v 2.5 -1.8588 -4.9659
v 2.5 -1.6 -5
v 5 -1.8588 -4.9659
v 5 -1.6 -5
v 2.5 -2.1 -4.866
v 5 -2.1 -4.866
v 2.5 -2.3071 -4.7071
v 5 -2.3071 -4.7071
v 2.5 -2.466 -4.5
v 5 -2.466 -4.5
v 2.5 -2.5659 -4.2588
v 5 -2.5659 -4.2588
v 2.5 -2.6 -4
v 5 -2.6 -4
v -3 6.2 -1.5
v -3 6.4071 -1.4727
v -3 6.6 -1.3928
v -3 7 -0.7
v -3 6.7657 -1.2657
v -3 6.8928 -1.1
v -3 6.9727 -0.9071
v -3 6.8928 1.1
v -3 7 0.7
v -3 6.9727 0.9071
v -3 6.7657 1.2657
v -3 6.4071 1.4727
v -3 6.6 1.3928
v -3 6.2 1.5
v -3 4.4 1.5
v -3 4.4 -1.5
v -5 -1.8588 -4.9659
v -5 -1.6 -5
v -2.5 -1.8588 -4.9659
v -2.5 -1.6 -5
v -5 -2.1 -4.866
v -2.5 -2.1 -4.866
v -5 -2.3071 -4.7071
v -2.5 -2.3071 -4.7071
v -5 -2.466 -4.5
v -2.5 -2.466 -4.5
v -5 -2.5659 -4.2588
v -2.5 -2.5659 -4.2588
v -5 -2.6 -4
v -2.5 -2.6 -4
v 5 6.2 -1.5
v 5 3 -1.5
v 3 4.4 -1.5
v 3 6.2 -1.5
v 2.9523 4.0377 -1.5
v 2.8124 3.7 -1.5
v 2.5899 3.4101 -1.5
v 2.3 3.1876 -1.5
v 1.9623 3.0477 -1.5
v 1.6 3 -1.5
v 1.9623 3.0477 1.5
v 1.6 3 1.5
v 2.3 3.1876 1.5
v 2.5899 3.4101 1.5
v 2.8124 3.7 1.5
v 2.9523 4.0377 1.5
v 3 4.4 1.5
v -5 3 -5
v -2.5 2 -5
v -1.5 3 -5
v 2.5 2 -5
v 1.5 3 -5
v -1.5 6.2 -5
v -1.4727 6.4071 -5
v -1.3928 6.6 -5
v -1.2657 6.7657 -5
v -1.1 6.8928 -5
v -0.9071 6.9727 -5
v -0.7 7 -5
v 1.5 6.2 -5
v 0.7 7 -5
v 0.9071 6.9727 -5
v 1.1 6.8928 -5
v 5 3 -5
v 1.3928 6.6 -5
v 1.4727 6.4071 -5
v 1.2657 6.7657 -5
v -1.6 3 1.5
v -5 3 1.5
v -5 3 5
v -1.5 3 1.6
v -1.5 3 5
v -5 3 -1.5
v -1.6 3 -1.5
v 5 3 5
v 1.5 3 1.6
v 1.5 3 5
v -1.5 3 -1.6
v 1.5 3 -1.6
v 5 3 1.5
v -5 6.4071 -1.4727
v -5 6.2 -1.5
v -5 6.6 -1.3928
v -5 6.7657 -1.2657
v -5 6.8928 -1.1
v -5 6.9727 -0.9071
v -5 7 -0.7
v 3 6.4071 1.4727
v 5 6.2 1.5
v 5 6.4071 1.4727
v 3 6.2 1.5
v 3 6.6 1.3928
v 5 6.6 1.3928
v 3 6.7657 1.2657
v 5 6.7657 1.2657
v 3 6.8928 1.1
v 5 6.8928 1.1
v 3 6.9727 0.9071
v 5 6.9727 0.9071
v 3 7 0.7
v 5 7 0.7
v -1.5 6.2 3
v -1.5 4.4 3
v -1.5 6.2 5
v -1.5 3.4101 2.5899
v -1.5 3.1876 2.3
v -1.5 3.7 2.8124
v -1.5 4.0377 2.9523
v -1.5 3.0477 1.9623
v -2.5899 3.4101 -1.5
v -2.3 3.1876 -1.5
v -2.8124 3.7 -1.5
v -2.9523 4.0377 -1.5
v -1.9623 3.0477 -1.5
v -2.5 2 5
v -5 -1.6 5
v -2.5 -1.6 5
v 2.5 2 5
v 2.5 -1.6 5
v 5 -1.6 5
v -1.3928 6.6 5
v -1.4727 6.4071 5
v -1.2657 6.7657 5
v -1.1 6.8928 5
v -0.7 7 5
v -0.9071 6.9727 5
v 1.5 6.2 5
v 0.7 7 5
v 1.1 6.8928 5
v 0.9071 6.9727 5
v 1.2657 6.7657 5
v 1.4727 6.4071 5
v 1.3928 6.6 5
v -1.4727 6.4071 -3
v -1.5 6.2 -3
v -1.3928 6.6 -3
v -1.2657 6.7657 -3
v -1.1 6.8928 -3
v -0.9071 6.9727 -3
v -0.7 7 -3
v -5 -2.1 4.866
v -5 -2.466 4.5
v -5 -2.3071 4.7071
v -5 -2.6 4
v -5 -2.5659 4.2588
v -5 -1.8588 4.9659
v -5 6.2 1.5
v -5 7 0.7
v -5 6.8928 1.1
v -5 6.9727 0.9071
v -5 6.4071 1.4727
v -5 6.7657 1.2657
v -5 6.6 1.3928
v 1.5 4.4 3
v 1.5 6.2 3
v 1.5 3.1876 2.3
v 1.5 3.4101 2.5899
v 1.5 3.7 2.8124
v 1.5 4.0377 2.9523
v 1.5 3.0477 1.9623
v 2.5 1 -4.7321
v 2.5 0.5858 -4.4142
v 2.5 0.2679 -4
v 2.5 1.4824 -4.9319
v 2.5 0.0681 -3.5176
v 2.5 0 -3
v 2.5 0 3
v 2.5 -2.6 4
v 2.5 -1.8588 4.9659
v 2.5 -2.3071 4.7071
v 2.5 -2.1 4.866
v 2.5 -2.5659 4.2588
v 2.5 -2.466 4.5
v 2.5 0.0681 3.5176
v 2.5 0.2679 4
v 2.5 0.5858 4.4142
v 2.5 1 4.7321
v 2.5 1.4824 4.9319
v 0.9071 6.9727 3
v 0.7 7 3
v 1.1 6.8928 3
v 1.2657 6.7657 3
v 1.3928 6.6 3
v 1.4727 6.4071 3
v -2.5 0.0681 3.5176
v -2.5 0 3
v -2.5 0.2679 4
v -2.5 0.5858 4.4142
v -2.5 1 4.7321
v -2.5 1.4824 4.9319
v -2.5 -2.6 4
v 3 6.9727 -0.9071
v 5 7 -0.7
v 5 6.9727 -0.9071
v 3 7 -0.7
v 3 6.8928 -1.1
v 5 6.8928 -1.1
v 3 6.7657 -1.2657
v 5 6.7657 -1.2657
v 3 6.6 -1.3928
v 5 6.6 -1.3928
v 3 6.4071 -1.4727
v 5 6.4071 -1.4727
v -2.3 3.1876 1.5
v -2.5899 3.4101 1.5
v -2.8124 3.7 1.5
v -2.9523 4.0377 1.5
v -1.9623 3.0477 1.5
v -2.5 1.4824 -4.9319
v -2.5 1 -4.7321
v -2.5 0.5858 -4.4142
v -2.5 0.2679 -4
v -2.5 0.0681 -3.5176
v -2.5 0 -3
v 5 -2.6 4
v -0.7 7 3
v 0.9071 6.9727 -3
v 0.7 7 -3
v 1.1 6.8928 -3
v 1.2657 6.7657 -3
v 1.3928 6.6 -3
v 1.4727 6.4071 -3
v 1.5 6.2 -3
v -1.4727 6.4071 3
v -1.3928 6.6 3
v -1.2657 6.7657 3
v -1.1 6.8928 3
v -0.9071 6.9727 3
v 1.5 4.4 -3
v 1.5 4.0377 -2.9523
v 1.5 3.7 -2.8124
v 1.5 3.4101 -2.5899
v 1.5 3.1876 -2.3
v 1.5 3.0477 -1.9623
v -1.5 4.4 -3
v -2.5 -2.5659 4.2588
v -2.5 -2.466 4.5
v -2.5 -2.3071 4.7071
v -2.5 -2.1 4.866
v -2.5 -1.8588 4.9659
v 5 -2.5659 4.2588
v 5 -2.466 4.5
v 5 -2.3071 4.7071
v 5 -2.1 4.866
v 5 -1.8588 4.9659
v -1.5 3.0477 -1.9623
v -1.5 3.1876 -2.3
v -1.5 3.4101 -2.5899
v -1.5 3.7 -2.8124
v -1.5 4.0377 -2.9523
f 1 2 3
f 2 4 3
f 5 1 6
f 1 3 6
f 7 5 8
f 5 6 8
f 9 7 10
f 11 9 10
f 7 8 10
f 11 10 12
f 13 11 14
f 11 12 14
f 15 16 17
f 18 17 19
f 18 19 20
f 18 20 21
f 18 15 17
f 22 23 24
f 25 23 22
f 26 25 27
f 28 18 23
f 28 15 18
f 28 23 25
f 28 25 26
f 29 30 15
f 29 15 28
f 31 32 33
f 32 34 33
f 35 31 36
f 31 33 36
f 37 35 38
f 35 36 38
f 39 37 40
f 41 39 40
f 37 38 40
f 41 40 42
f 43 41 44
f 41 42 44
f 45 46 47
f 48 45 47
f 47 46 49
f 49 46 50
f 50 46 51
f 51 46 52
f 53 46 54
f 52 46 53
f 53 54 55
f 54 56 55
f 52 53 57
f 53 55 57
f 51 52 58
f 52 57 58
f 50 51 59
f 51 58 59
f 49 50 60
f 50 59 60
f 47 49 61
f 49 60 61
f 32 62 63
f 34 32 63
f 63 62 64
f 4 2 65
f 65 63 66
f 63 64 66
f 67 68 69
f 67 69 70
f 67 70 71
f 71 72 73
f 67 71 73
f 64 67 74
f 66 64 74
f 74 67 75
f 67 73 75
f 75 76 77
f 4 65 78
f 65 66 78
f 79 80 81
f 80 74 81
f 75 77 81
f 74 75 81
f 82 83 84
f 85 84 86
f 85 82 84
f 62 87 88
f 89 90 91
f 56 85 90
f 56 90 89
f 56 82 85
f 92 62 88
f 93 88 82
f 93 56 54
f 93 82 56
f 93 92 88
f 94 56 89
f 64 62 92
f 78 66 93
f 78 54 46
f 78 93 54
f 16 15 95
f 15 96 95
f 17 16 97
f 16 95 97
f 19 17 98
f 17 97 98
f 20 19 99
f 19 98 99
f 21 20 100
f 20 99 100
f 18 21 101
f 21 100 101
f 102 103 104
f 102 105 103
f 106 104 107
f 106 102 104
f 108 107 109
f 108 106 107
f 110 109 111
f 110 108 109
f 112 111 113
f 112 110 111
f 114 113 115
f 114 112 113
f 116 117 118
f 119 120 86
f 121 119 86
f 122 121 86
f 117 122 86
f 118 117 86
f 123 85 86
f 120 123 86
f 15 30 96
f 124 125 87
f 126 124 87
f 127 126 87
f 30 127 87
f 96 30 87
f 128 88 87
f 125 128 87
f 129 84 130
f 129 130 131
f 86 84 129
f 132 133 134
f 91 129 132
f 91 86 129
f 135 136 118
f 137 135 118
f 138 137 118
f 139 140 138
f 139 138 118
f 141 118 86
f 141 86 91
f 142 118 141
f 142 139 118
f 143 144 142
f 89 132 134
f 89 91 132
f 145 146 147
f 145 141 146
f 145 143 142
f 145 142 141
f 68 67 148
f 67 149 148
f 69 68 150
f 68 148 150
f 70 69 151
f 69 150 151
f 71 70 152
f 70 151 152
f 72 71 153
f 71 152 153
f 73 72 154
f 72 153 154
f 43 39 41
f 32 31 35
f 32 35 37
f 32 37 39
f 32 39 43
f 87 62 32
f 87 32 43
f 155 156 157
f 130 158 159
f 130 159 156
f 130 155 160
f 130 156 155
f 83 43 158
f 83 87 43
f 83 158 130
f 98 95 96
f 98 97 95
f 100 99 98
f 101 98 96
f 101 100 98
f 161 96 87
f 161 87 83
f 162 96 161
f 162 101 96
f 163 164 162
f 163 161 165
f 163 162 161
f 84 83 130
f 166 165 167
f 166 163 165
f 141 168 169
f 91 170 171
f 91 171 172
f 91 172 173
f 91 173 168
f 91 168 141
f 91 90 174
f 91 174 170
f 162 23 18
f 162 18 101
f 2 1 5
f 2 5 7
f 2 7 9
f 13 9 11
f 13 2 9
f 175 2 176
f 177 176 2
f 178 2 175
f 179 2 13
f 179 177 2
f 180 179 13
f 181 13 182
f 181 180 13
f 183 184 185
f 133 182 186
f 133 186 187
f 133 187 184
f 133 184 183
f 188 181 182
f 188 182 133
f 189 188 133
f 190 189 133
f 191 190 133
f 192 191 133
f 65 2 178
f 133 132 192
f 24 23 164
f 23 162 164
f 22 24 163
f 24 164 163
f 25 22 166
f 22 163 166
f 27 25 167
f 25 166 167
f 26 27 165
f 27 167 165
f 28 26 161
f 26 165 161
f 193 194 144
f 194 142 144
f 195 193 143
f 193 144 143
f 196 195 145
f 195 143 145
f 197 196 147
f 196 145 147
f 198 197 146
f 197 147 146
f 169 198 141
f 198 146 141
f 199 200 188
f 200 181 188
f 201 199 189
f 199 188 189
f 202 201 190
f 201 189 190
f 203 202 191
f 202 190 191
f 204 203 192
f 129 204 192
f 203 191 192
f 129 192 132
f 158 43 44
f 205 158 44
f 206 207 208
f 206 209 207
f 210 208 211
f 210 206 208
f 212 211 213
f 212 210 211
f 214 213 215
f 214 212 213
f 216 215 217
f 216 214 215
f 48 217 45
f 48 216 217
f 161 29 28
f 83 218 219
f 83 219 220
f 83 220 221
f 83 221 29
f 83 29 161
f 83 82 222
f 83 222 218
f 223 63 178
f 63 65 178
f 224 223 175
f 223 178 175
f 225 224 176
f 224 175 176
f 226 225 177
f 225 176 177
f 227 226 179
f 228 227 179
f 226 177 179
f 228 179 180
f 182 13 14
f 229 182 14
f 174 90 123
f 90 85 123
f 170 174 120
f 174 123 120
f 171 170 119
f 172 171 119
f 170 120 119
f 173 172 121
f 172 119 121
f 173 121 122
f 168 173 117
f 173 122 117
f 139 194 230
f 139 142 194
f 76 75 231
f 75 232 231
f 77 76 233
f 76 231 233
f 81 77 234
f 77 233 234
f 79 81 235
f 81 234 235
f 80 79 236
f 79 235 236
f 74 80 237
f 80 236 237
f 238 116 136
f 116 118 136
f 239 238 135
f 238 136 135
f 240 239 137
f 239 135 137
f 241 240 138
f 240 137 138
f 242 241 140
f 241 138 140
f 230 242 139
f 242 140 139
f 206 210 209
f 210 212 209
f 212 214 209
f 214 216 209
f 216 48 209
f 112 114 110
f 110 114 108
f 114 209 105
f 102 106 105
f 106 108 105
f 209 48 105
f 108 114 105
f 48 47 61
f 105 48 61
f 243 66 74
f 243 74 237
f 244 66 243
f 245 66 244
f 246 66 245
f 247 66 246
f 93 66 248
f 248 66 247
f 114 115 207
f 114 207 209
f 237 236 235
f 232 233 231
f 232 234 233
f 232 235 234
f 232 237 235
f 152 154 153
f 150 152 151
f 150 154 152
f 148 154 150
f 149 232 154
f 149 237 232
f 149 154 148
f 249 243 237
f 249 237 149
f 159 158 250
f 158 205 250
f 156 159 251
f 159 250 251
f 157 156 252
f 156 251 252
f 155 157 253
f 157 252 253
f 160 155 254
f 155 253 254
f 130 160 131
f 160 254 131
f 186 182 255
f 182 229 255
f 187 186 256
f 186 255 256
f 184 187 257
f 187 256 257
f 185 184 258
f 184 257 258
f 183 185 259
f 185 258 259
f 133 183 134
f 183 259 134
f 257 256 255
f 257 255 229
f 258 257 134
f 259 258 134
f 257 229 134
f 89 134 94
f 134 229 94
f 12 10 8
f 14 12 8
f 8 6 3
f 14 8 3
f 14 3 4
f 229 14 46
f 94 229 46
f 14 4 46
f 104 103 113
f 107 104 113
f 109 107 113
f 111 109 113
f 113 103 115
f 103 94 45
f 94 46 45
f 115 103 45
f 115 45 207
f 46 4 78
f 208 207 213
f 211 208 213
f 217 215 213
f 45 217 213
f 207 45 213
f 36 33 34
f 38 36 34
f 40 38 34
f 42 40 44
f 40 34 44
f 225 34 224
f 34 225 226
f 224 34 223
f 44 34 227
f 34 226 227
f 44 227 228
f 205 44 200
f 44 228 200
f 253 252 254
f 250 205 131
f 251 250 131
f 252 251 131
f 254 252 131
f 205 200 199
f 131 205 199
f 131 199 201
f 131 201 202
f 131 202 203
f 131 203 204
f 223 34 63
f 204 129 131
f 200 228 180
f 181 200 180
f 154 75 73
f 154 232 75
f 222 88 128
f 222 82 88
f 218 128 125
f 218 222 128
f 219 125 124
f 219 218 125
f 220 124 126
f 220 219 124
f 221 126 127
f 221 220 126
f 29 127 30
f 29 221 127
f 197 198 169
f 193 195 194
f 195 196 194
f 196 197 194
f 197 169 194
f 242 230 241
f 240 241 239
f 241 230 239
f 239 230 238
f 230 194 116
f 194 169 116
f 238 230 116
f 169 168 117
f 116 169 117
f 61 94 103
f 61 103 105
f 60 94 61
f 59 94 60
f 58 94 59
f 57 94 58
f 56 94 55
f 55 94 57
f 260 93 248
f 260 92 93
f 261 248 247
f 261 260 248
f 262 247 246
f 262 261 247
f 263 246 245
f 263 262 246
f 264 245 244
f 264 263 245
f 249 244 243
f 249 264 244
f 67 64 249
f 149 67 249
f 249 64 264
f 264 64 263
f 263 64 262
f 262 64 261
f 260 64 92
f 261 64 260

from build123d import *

# Parameters (mm, degrees)
BOX_W        = 10
BOX_H        = 3
BOX_DEPTH    = 10
SKETCH_W     = 3
SKETCH_H     = 2
SKETCH_W_2   = 2
SKETCH_H_2   = 3
PAD_DEPTH    = 4
SKETCH001_W  = 2.5
SKETCH001_H  = 10
PAD001_DEPTH = 2.6
FILLET_R     = 2
FILLET001_R  = 0.8
FILLET002_R  = 1
FILLET003_R  = 1.4


with BuildPart() as part:
    # Box → Box (new body)
    with BuildSketch(Plane(origin=(-5, 0, -5), x_dir=(1, 0, 0), z_dir=(0, 0, 1))):
        with Locations((5, 1.5)):
            Rectangle(BOX_W, BOX_H)
    extrude(amount=BOX_DEPTH)

    # Sketch → Pad (new body)
    with BuildSketch(Plane(origin=(-5, 3, -5), x_dir=(-1, 0, 0), z_dir=(0, 1, 0))):
        with Locations((-5, 9)):
            Rectangle(SKETCH_W, SKETCH_H)
        with Locations((-9, 5)):
            Rectangle(SKETCH_W_2, SKETCH_H_2)
        with Locations((-1, 5)):
            Rectangle(SKETCH_W_2, SKETCH_H_2)
        with Locations((-5, 1)):
            Rectangle(SKETCH_W, SKETCH_H)
    extrude(amount=PAD_DEPTH)

    # Sketch001 → Pad001 (new body)
    with BuildSketch(Plane(origin=(-5, 0, -5), x_dir=(1, 0, 0), z_dir=(0, -1, 0))):
        with Locations((1.25, 5)):
            Rectangle(SKETCH001_W, SKETCH001_H)
        with Locations((8.75, 5)):
            Rectangle(SKETCH001_W, SKETCH001_H)
    extrude(amount=PAD001_DEPTH)

    # Fillet
    fillet_edges = [part.edges().sort_by_distance(p)[0] for p in [
        (0, 0, -5),
        (0, 0, 5),
    ]]
    fillet(fillet_edges, radius=FILLET_R)

    # Fillet001
    fillet001_edges = [part.edges().sort_by_distance(p)[0] for p in [
        (4, 7, -1.5),
        (4, 7, 1.5),
        (1.5, 7, 4),
        (-1.5, 7, 4),
        (-4, 7, 1.5),
        (-4, 7, -1.5),
        (-1.5, 7, -4),
        (1.5, 7, -4),
    ]]
    fillet(fillet001_edges, radius=FILLET001_R)

    # Fillet002
    fillet002_edges = [part.edges().sort_by_distance(p)[0] for p in [
        (-3.75, -2.6, -5),
        (3.75, -2.6, -5),
        (3.75, -2.6, 5),
        (-3.75, -2.6, 5),
    ]]
    fillet(fillet002_edges, radius=FILLET002_R)

    # Fillet003
    fillet003_edges = [part.edges().sort_by_distance(p)[0] for p in [
        (0, 3, -3),
        (-3, 3, 0),
        (3, 3, 0),
        (0, 3, 3),
    ]]
    fillet(fillet003_edges, radius=FILLET003_R)


solid = part.part
